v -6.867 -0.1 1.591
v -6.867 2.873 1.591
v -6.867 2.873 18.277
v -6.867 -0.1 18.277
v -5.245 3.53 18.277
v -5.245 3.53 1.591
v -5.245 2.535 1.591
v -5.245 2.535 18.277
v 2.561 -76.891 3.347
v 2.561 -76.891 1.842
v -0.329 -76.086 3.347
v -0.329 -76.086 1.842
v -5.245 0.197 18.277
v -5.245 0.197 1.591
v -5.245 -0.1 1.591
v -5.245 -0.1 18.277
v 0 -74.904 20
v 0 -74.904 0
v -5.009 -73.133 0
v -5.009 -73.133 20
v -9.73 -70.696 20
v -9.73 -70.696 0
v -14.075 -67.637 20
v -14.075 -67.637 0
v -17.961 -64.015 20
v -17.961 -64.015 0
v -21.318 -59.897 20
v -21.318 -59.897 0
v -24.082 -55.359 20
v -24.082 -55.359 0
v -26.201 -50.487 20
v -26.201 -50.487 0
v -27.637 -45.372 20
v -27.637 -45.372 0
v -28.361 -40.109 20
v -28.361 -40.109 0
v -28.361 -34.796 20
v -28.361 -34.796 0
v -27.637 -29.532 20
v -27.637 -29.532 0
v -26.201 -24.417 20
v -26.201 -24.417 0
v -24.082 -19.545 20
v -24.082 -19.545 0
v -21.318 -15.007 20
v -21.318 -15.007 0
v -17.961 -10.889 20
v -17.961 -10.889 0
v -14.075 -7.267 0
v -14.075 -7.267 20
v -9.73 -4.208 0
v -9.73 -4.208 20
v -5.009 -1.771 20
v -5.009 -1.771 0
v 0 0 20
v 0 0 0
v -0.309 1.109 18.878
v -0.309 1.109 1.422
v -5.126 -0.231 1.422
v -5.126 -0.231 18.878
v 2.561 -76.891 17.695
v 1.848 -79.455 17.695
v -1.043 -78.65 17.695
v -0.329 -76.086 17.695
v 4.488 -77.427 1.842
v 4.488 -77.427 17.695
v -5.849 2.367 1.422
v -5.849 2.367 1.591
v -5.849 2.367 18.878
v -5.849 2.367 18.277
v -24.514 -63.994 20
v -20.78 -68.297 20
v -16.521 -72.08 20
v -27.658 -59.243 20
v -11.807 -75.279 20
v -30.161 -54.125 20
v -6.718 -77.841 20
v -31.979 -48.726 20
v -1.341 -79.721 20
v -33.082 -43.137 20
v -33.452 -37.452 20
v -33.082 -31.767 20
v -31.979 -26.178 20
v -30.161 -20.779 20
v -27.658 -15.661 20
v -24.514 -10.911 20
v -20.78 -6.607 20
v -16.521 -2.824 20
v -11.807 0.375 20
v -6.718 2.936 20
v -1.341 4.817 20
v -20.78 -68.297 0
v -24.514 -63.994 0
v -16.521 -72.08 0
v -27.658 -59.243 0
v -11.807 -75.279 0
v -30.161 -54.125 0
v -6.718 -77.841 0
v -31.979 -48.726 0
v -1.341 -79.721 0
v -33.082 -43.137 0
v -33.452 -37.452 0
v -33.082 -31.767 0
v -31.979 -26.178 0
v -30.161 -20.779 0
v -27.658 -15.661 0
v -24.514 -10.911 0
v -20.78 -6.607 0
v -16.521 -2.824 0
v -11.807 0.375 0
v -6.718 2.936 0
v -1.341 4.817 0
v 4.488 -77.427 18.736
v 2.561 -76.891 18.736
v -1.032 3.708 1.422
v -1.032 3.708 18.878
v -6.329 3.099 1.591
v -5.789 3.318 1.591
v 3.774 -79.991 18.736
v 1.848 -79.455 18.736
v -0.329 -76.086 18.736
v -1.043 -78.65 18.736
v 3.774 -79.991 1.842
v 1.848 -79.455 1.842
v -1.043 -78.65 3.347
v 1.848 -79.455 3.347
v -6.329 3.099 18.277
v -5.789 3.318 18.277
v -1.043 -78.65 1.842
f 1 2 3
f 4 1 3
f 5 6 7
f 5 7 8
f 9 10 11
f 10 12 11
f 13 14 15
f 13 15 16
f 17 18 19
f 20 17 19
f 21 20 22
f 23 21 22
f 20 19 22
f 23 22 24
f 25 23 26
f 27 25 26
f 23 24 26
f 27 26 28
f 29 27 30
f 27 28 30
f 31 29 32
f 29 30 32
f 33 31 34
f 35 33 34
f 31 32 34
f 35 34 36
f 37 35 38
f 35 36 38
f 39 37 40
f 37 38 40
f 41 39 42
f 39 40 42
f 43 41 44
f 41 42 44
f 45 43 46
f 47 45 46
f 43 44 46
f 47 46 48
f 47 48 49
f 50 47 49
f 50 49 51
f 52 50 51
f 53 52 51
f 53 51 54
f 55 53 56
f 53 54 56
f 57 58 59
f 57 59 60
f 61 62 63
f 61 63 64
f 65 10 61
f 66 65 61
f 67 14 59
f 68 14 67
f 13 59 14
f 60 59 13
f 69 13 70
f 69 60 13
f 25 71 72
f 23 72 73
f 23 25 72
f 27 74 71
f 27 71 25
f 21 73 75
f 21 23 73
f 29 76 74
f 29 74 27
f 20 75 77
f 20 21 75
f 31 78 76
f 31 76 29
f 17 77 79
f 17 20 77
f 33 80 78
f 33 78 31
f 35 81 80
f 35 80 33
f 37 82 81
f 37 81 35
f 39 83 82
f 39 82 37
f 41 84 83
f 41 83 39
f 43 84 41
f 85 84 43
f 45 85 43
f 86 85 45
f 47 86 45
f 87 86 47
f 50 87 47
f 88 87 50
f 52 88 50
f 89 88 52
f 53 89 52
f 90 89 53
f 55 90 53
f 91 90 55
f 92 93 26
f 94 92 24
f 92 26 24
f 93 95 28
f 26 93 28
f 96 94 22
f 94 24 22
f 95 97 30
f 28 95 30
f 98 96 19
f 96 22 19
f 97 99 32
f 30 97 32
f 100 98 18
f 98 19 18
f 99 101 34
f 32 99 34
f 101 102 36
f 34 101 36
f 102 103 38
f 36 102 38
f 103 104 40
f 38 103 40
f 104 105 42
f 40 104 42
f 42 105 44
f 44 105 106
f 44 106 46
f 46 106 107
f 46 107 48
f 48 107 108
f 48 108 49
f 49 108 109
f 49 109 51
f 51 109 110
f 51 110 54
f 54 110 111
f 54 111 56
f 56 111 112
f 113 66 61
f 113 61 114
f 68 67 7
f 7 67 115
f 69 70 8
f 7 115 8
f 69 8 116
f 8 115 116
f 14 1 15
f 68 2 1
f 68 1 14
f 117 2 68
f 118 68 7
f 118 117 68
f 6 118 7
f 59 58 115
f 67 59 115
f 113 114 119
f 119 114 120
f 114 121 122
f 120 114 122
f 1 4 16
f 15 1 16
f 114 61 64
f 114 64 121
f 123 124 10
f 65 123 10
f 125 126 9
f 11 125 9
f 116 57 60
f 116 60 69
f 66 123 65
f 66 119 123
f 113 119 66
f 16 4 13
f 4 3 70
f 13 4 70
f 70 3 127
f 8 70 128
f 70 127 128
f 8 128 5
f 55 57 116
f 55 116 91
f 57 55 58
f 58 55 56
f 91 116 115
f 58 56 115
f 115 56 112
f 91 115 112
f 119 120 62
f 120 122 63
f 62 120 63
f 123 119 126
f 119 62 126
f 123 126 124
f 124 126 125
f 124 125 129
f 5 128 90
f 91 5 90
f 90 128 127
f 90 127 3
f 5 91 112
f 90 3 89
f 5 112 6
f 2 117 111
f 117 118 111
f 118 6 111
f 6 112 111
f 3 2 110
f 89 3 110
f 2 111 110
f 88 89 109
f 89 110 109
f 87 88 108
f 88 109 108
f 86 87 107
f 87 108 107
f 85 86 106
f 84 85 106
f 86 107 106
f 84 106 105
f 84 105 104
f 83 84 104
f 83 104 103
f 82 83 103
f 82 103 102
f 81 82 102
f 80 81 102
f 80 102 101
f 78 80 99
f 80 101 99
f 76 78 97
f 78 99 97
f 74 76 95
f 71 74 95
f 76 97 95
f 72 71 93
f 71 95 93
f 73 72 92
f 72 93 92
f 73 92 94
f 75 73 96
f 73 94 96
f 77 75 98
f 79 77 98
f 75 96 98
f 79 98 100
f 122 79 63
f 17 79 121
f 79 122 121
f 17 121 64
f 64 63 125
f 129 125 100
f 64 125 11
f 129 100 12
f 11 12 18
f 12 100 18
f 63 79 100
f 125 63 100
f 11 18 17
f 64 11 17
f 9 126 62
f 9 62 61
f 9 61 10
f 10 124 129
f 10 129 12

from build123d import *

# Parameters (mm, degrees)
F1_DEPTH  = 20
F2_W      = 2.6613399386
F2_H      = 1.0413937271
F2_H_2    = 1.5042340383
F3_DEPTH  = 3
F5_DEPTH  = 2
F6_W      = 2.6971405605
F6_H      = 17.4564992776
F7_DEPTH  = 5
F9_W      = 1.6222847626
F9_H      = 16.6863657068
F10_DEPTH = 4.8


# Not quite as in the source:
# - ends of sketch curves that miss each other by under 0.0002 mm in the source are joined


with BuildPart() as f1:
    # F0 (on Top) → F1 (new body)
    with BuildSketch(Plane.XY):
        with BuildLine():
            ThreePointArc((0, -74.9042034149), (-28.4520233491, -37.4521017075), (0, 0))
            Line((0, 0), (-1.3406298741, 4.8169190701))
            ThreePointArc((-1.3406298741, 4.8169190701), (-33.4520231279, -37.4521017075), (-1.3406298741, -79.7211224851))
            Line((-1.3406298741, -79.7211224851), (0, -74.9042034149))
        make_face()
    extrude(amount=F1_DEPTH)

    # F2 (on face) → F3 (join)
    with BuildSketch(Plane(origin=(19.3483734862, -5.3849788907, 0), x_dir=(0.2681259867, 0.9633838567, 0), z_dir=(0.9633838567, -0.2681259867, 0))):
        with Locations((-74.7193582356, 18.2154309005)):
            Rectangle(F2_W, F2_H)
        with Locations((-74.7193582356, 2.5945375673)):
            Rectangle(F2_W, F2_H_2)
    extrude(amount=F3_DEPTH)

    # F4 (on face) → F5 (join)
    with BuildSketch(Plane(origin=(22.2385250561, -6.1893568507, 0), x_dir=(0.2681259867, 0.9633838567, 0), z_dir=(0.9633838567, -0.2681259867, 0))):
        Polygon((-73.3886882663, 17.6947340369), (-76.0500282049, 17.6947340369), (-76.0500282049, 1.8424974987), (-73.3886659145, 1.8424974987), align=None)
        Polygon((-73.3886659145, 18.736127764), (-76.0500282049, 18.736127764), (-76.0500282049, 17.6947340369), (-73.3886882663, 17.6947340369), align=None)
    extrude(amount=F5_DEPTH)

    # F6 (on face) → F7 (cut)
    with BuildSketch(Plane(origin=(0, 0, 0), x_dir=(-0.2681259867, 0.9633838567, 0), z_dir=(0.9633838567, 0.2681259867, 0))):
        with Locations((2.4999994203, 10.1498414879)):
            Rectangle(F6_W, F6_H)
    extrude(amount=-F7_DEPTH, mode=Mode.SUBTRACT)

    # F9 (on offset) → F10 (cut)
    with BuildSketch(Plane.XZ.offset(-4.7)):
        with Locations((-6.0561252758, 9.9340636516)):
            Rectangle(F9_W, F9_H)
    extrude(amount=F10_DEPTH, mode=Mode.SUBTRACT)


solid = f1.part
